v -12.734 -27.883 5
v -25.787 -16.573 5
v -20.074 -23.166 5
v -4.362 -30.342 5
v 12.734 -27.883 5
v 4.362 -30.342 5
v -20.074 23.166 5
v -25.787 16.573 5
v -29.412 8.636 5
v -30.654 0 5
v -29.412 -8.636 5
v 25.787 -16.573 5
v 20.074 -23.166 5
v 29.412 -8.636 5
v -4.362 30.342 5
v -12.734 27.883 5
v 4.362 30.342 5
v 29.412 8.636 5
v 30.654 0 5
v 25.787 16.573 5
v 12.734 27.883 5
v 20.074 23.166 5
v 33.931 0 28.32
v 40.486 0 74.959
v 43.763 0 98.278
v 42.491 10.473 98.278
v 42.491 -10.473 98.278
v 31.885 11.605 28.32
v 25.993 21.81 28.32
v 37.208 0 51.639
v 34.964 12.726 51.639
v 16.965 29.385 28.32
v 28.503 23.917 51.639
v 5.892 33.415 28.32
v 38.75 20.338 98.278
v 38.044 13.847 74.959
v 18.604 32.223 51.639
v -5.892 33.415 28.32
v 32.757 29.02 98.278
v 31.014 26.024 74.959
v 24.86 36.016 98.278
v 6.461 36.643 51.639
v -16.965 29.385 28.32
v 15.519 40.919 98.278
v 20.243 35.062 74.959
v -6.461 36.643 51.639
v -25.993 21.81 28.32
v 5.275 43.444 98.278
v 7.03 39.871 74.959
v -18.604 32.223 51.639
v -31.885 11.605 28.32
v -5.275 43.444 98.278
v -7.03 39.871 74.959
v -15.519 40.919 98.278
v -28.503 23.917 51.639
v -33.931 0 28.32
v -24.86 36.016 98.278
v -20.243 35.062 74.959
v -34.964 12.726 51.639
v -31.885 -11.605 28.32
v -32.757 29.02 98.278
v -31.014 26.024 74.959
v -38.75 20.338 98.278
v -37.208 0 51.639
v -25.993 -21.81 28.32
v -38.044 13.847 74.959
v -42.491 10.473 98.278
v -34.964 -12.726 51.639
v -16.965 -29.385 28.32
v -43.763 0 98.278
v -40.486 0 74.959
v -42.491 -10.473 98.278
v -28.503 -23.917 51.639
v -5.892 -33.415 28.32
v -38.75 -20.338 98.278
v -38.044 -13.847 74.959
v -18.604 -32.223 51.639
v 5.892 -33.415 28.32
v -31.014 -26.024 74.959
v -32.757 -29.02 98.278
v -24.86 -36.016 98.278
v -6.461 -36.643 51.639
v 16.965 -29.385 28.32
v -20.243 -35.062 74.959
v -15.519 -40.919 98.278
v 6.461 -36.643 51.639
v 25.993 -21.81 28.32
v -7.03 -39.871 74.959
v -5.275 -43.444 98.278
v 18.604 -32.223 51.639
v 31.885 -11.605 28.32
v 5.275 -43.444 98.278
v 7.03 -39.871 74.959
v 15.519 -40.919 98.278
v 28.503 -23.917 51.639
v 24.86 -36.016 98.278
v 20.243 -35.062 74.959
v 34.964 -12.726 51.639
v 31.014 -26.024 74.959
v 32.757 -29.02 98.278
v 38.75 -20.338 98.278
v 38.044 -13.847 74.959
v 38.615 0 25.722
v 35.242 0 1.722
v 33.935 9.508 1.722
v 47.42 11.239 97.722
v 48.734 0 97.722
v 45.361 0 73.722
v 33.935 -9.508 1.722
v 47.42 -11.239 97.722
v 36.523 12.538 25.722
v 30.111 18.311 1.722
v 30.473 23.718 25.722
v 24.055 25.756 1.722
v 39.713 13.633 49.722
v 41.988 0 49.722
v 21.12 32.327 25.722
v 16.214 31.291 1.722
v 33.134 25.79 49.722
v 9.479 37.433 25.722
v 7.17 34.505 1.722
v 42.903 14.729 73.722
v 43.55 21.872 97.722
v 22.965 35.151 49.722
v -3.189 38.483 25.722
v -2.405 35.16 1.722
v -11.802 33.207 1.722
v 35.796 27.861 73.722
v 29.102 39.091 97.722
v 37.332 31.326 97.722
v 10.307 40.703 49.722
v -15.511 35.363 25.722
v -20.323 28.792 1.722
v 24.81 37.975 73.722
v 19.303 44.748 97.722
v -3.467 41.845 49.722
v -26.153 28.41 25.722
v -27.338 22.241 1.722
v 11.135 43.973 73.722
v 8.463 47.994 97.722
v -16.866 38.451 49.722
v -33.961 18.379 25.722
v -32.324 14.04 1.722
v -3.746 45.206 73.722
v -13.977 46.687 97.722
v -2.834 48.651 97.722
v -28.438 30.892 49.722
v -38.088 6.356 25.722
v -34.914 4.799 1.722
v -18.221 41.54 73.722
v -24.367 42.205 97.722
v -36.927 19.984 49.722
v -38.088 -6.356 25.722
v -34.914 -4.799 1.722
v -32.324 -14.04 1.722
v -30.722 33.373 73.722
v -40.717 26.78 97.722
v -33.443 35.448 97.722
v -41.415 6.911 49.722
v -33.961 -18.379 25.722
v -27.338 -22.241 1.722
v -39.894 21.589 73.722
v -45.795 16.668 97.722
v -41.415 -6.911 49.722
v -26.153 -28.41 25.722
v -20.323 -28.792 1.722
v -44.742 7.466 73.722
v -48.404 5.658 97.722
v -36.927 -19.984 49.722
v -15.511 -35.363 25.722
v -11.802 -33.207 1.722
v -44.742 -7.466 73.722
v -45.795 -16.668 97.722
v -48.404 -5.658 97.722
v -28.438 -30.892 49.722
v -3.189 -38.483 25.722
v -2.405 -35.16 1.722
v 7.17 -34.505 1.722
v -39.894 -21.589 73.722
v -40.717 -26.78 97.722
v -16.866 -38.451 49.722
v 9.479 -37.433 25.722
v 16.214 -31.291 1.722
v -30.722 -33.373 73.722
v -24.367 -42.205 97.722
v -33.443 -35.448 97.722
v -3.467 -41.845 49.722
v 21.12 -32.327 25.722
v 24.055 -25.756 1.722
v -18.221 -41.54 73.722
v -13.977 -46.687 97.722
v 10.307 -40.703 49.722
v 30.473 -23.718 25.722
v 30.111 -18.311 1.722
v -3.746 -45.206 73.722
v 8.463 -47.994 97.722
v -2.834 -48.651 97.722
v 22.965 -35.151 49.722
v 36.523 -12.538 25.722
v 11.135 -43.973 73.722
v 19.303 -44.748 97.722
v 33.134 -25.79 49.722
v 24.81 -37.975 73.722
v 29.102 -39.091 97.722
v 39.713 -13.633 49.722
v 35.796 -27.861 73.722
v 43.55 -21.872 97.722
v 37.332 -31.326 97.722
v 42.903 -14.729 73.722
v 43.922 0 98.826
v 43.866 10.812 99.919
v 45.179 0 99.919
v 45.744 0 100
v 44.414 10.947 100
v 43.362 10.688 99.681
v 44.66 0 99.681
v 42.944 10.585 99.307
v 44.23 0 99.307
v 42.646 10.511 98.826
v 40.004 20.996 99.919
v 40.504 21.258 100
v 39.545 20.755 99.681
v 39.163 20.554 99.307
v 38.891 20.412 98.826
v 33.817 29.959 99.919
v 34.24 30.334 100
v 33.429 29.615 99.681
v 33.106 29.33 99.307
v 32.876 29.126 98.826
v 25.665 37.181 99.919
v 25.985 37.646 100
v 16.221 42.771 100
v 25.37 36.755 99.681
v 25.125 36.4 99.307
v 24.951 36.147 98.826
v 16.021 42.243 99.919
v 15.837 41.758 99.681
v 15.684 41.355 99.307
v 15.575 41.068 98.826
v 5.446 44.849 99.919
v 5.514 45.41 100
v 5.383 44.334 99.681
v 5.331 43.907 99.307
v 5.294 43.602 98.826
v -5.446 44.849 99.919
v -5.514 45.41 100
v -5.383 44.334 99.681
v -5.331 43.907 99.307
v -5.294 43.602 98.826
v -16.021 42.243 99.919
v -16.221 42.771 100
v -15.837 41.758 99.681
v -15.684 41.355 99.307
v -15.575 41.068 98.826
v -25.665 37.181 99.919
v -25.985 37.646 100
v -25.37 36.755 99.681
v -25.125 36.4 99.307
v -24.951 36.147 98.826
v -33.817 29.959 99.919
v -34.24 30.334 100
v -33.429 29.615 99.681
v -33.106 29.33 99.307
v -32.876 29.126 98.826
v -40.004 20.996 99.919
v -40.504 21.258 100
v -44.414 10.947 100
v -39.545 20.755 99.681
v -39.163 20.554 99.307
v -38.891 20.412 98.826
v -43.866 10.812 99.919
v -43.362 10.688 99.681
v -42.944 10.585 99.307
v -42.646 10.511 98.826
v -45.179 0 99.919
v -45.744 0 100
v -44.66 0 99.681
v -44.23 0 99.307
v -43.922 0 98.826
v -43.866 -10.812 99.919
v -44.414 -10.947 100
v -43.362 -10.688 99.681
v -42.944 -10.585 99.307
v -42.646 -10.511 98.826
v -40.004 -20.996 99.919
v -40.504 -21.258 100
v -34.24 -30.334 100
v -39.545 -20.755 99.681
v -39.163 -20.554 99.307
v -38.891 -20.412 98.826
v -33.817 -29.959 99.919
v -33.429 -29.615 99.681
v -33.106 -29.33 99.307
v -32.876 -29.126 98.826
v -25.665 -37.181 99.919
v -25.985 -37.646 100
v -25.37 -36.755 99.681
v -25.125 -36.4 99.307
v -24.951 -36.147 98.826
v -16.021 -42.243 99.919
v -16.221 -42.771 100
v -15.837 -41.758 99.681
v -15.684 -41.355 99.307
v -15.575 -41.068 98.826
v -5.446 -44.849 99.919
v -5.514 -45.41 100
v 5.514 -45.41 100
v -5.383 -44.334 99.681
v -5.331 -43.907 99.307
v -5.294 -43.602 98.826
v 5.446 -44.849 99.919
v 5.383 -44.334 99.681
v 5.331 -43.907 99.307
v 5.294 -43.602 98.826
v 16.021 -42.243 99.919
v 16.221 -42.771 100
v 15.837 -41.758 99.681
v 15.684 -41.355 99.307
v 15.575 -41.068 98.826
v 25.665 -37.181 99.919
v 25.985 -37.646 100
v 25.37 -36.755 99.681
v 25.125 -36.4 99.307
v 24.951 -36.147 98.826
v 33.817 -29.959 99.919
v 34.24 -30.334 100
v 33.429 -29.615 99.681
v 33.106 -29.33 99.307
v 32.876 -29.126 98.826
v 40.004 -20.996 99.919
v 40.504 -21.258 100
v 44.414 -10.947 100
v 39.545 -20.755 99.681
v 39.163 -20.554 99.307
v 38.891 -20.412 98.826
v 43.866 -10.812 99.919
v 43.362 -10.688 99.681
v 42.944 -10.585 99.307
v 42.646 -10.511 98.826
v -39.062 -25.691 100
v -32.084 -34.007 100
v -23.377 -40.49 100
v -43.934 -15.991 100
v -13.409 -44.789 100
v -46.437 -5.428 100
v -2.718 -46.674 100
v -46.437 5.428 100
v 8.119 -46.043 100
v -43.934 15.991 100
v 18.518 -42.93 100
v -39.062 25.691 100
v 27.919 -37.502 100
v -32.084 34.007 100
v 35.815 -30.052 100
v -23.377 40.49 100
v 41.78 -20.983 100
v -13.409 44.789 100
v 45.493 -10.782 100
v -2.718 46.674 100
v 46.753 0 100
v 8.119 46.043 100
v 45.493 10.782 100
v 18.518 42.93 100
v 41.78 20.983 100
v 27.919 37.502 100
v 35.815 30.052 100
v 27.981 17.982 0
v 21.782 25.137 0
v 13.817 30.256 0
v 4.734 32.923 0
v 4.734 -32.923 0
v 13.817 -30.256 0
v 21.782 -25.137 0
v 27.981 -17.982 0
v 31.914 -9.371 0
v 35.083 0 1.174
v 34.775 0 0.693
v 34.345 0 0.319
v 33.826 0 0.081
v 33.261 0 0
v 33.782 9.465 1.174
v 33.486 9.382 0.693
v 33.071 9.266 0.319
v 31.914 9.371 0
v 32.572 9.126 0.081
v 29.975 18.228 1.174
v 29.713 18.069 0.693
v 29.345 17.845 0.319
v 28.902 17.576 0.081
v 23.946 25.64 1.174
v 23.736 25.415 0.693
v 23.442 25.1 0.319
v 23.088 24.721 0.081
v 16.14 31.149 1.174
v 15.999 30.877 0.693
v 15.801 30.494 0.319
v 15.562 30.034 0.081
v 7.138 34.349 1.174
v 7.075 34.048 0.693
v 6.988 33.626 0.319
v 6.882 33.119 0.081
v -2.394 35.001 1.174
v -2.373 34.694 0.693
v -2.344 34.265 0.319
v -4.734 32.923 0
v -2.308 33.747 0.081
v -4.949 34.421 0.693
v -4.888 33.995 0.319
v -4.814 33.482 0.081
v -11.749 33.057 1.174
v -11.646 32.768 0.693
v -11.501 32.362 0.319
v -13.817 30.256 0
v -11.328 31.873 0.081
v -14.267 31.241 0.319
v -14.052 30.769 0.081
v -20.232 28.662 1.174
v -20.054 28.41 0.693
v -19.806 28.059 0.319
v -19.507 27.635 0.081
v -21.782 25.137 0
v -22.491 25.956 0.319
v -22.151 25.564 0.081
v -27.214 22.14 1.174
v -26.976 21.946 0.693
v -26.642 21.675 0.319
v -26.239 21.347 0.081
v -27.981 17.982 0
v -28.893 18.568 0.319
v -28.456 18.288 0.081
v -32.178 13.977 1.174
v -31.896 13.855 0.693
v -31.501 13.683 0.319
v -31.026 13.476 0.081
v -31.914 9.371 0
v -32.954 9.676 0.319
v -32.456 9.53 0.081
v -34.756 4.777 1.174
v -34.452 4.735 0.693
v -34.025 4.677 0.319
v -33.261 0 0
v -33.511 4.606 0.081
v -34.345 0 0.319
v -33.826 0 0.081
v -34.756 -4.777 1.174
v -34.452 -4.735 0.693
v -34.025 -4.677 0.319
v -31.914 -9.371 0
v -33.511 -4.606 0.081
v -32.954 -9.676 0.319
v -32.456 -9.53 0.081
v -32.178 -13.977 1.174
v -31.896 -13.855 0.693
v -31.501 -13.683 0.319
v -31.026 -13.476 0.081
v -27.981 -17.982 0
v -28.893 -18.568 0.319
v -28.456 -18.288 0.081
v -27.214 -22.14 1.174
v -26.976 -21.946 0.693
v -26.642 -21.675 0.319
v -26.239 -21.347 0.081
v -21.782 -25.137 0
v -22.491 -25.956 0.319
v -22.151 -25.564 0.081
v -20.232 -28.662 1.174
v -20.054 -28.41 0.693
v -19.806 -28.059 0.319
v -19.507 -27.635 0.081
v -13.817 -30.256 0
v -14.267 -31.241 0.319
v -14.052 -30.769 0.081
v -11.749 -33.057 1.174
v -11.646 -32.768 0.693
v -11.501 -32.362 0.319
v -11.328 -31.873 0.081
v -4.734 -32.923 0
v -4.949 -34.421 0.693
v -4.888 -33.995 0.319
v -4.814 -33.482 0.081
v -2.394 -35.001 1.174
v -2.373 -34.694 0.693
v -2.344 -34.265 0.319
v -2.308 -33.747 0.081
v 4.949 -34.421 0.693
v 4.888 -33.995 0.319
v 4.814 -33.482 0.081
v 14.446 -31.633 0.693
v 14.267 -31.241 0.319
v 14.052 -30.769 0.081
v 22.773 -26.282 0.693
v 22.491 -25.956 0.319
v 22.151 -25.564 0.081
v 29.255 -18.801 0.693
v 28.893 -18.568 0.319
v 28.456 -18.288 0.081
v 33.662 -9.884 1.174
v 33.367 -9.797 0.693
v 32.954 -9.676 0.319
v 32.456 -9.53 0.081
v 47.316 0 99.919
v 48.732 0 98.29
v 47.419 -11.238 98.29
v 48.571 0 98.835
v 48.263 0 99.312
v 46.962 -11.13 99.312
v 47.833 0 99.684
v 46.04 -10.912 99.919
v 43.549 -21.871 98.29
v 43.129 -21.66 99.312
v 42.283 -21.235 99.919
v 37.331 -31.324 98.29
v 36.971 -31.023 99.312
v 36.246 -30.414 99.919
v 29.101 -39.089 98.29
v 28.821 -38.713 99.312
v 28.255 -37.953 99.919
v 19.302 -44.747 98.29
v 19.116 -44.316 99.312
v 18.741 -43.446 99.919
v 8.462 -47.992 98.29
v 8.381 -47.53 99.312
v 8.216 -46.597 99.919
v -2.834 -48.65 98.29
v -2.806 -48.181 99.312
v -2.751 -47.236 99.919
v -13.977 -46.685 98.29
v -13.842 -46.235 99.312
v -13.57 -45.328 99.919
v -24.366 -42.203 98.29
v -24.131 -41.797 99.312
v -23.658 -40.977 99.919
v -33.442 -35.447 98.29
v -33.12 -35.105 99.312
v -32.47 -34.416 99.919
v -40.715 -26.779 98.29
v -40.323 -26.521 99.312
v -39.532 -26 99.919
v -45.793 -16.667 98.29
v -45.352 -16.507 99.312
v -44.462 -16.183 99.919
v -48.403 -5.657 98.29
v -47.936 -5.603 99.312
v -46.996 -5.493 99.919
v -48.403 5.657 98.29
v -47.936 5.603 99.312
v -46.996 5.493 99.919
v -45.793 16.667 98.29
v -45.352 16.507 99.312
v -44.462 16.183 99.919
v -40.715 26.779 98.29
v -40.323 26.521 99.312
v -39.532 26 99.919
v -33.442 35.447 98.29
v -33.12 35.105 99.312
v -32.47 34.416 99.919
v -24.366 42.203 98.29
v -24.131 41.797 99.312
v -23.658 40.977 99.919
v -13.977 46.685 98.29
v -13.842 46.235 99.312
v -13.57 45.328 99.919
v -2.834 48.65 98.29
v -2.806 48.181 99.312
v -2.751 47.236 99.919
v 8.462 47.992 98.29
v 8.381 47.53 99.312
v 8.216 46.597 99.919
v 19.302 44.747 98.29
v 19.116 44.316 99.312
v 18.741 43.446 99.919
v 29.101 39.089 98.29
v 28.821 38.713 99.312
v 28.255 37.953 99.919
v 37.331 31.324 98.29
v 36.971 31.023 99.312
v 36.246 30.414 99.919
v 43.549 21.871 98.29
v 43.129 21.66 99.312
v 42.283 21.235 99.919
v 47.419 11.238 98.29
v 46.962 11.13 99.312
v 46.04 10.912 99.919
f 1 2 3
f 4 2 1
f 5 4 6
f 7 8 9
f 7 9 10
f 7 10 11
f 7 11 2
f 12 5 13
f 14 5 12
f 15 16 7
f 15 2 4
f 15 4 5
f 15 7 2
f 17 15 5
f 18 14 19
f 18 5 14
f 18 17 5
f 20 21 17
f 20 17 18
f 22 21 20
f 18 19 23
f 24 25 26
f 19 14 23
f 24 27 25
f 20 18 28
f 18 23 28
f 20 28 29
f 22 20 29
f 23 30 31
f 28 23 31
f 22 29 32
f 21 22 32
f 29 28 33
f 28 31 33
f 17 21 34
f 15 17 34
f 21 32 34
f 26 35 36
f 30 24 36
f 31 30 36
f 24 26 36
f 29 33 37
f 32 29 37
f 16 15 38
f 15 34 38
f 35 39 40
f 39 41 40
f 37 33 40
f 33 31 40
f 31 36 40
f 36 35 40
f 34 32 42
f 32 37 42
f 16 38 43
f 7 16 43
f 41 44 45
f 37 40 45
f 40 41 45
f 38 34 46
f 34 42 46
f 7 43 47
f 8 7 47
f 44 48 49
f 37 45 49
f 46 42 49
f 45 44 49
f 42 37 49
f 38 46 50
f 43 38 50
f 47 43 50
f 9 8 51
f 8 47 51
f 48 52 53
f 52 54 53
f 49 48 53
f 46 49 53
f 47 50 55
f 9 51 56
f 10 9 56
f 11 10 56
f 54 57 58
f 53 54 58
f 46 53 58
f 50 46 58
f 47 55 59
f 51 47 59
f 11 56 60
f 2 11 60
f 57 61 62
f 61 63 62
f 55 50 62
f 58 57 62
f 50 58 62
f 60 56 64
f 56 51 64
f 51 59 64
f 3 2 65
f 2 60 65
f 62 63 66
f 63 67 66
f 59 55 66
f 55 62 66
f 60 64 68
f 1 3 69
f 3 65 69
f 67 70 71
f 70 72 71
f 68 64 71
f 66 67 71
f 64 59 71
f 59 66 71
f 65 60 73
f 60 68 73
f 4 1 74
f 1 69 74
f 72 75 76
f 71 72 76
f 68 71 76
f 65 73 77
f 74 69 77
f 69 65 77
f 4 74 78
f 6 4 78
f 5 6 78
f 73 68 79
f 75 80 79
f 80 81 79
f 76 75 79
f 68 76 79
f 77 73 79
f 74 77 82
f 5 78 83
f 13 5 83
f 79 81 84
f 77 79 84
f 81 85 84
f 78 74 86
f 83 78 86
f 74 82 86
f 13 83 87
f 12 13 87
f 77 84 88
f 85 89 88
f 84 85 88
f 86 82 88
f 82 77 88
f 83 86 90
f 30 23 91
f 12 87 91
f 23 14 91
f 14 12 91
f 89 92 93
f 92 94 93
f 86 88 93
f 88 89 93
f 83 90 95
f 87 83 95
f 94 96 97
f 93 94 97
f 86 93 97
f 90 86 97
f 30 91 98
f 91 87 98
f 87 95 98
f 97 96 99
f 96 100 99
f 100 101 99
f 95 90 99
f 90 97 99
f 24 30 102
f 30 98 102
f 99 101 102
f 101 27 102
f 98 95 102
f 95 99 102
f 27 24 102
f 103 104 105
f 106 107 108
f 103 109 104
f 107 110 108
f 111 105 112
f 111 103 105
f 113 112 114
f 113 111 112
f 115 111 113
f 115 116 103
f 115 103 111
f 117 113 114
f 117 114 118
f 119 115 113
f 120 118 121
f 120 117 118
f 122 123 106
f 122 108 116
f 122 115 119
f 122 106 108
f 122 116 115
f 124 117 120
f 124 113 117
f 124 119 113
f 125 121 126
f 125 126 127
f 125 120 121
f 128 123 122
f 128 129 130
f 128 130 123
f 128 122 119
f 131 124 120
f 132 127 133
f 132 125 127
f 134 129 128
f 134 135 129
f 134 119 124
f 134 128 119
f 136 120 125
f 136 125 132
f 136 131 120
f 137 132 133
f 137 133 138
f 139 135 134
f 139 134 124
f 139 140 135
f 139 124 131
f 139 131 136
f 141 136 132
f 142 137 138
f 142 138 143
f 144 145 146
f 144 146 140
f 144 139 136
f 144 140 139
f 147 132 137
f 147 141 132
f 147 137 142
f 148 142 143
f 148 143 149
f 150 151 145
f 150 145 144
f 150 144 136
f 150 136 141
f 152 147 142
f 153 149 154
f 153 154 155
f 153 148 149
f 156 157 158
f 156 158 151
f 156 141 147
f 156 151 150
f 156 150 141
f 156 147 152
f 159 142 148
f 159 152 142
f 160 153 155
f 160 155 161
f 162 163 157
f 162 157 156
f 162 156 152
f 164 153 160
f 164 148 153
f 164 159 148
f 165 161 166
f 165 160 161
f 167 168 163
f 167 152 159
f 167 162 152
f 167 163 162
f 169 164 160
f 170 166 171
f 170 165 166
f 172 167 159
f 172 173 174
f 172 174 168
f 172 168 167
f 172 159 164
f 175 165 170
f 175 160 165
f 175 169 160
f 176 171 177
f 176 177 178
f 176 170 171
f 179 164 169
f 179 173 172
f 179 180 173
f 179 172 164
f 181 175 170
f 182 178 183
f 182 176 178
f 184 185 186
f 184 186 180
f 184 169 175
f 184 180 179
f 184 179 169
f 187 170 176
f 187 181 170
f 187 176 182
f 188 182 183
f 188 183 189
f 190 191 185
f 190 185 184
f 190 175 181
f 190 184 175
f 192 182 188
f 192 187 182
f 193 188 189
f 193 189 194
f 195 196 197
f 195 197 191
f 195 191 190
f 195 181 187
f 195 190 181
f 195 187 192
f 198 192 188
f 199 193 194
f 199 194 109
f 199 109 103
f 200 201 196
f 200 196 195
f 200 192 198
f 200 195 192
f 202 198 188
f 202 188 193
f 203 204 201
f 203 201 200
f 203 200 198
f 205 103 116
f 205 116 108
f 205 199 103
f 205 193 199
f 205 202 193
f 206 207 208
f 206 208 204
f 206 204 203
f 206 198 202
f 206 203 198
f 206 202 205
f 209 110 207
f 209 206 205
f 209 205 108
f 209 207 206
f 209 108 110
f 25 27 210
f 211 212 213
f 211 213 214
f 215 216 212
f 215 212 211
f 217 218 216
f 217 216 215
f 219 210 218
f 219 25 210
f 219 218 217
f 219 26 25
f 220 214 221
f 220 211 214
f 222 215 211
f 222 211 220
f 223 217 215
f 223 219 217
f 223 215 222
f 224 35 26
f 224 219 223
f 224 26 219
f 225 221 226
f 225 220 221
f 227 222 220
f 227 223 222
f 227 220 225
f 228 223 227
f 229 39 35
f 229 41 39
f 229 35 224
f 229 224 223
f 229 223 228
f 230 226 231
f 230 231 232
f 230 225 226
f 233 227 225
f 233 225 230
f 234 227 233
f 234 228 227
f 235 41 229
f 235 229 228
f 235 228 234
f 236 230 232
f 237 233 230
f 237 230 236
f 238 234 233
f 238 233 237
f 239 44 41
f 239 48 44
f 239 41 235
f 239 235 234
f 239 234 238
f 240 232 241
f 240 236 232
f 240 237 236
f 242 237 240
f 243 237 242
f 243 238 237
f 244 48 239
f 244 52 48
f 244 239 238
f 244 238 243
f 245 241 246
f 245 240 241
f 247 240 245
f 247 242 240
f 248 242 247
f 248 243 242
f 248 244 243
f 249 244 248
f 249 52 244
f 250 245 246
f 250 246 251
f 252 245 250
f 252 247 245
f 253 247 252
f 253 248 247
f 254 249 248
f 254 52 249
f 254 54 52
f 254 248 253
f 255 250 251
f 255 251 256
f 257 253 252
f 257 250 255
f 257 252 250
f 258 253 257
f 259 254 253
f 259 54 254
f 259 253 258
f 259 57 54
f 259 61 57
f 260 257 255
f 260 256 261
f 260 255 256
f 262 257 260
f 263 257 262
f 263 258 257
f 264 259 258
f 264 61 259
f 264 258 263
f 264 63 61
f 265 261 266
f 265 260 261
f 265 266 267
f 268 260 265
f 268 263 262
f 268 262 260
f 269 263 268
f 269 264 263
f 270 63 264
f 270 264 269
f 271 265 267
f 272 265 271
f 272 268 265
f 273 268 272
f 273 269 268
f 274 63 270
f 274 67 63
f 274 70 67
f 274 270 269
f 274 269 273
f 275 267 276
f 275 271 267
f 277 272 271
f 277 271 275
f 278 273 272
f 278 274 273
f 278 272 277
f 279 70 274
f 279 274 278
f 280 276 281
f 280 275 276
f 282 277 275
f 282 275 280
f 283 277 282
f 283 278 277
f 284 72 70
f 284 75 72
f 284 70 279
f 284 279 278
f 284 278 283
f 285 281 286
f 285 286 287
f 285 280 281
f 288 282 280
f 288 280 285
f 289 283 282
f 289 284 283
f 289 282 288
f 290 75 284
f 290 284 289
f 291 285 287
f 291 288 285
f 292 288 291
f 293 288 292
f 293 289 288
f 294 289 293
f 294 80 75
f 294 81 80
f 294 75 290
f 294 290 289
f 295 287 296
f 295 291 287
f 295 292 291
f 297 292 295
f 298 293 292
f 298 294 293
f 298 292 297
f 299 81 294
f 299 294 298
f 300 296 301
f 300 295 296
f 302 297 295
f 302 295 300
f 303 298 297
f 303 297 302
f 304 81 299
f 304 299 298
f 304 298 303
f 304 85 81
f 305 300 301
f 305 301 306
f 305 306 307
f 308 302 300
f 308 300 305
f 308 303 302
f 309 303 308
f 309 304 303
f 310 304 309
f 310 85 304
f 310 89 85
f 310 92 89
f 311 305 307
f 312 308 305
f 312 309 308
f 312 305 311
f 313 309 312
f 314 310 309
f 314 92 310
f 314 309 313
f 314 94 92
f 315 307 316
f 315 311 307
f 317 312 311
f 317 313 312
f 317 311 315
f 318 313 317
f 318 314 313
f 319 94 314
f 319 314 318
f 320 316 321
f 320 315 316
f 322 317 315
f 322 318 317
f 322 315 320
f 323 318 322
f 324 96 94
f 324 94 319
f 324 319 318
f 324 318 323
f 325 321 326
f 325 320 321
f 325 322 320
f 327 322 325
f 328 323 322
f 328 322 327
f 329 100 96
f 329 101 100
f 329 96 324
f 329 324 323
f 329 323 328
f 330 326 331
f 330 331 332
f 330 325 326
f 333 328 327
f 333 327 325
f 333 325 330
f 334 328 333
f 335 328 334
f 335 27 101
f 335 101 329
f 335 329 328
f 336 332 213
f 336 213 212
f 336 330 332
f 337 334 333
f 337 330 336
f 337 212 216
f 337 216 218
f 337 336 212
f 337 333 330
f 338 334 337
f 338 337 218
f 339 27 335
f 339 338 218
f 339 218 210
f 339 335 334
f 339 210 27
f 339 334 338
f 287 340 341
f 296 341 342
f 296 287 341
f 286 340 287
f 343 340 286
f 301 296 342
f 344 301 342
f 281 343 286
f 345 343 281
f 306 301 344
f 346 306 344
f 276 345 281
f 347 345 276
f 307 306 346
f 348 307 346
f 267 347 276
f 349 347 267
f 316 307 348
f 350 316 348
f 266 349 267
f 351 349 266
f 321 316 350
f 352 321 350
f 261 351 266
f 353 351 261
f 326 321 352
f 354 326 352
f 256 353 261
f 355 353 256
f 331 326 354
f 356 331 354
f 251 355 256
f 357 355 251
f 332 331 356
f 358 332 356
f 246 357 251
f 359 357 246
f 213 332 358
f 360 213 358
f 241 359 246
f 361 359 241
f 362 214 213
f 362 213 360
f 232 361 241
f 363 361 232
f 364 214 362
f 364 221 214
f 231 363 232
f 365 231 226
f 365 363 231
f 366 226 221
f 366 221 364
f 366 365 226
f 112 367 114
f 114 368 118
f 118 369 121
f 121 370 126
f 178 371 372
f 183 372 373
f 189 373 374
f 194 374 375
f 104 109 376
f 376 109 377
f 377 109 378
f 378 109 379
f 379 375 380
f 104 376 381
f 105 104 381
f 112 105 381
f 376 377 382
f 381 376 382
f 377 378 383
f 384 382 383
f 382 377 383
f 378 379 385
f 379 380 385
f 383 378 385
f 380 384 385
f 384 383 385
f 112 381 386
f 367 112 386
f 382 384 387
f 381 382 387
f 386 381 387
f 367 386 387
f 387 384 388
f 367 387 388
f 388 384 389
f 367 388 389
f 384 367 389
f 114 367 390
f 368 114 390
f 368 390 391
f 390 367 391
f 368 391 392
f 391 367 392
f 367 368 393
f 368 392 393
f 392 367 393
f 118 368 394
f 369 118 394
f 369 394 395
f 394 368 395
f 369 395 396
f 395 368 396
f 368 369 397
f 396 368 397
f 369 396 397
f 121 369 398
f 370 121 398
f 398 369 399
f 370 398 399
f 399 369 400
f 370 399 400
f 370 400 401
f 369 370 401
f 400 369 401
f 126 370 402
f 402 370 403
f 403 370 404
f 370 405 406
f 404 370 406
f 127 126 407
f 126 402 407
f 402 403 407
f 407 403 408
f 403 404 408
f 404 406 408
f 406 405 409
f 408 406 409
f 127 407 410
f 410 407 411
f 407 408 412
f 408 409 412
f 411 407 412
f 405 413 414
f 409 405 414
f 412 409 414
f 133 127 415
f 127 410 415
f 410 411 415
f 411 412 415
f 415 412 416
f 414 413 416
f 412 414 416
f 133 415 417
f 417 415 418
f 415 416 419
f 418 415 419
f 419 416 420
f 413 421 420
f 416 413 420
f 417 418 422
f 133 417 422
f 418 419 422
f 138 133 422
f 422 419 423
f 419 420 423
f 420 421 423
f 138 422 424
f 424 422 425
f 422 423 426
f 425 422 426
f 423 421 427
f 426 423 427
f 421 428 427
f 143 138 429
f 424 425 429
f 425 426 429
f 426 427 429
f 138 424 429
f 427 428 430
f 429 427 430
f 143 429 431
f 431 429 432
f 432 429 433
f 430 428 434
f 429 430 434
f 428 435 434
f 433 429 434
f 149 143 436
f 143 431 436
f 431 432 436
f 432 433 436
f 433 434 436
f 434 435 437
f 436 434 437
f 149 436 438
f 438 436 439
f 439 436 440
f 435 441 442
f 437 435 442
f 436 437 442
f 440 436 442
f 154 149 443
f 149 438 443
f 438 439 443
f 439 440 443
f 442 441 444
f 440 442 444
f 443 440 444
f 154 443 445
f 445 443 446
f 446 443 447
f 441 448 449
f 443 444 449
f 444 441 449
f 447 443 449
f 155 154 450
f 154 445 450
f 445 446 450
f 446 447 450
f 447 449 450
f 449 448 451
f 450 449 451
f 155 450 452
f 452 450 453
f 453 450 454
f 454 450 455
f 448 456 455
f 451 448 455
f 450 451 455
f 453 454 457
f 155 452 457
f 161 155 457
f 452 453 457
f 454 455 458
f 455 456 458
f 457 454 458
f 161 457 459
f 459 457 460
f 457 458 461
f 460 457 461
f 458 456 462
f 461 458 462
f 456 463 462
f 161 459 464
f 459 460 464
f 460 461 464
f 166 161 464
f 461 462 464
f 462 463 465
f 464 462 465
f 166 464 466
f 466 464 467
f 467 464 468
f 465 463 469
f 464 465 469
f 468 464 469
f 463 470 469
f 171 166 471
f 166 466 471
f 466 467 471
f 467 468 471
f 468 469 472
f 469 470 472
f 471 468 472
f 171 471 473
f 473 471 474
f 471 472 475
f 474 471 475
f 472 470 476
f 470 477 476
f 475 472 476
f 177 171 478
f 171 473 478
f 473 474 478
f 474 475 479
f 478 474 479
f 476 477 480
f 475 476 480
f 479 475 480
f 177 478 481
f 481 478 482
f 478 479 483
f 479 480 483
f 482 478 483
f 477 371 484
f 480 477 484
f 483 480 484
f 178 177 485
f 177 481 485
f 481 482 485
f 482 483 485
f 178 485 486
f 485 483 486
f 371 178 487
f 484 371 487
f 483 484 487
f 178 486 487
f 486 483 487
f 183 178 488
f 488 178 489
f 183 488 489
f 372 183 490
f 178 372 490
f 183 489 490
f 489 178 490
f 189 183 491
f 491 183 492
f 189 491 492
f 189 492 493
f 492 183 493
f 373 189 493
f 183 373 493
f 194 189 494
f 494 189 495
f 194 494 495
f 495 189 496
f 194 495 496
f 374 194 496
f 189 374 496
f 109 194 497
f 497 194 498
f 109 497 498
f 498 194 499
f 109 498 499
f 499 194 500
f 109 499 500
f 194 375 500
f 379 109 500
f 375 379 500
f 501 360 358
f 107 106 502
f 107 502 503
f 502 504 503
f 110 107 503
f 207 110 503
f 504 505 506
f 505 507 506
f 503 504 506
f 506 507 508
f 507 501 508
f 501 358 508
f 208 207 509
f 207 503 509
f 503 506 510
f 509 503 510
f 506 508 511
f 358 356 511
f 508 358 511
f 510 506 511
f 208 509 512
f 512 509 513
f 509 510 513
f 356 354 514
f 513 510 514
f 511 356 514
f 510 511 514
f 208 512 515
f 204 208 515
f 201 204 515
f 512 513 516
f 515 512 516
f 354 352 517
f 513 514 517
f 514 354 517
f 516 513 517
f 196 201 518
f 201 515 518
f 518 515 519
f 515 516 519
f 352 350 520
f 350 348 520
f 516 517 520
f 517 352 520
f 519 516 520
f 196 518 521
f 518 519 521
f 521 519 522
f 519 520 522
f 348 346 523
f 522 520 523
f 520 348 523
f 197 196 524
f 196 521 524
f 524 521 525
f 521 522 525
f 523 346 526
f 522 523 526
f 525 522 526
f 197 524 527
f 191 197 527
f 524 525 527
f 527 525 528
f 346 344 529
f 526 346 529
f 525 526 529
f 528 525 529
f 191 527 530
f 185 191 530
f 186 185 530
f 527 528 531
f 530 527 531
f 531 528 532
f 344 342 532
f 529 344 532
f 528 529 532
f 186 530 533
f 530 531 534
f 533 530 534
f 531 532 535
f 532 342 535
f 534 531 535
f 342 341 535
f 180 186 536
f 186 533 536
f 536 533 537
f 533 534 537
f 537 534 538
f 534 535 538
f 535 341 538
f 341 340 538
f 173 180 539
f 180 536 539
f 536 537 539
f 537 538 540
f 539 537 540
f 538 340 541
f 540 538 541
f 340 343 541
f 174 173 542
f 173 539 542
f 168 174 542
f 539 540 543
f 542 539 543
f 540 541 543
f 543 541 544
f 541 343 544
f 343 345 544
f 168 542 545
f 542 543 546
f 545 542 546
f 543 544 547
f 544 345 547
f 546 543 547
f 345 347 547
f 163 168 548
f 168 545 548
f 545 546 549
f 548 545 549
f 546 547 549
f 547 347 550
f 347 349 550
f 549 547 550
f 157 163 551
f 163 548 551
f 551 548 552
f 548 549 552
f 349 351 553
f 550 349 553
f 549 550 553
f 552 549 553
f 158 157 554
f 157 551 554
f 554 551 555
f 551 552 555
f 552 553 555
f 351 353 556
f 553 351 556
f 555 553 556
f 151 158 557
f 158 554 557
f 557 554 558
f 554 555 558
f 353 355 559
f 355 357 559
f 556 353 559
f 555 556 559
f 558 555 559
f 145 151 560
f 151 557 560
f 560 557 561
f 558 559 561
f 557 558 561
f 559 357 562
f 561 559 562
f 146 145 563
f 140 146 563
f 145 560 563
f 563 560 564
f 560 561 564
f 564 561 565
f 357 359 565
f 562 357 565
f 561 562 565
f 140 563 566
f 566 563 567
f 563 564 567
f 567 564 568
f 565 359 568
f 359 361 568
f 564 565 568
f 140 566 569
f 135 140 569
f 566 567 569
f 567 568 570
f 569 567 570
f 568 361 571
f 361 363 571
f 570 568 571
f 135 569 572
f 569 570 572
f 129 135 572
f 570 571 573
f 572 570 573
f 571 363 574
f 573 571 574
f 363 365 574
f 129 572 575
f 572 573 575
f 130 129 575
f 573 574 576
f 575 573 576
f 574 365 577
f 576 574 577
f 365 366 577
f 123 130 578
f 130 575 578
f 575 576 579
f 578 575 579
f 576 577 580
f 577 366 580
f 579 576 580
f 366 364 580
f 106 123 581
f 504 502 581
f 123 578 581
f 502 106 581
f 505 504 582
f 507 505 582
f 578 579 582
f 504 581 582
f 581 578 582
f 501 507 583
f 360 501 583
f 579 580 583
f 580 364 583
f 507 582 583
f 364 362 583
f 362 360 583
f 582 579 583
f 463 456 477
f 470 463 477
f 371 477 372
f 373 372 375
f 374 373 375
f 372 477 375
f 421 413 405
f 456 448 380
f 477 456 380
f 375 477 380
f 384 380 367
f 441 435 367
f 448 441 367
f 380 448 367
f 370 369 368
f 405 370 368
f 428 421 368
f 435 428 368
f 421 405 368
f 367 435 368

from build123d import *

# Parameters (mm, degrees)
F0_R     = 35
F1_DEPTH = 100
F1_TAPER = -8
F2_T     = -5
F3_R     = 2


with BuildPart() as f1:
    # F0 (on Top) → F1 (new body)
    with BuildSketch(Plane.XY):
        Circle(F0_R)
    extrude(amount=F1_DEPTH, taper=F1_TAPER)

    # F2
    f2_openings = [f1.faces().sort_by_distance(p)[0] for p in [
        (0, 0, 100),
    ]]
    offset(amount=F2_T, openings=f2_openings, kind=Kind.INTERSECTION)

    # F3
    f3_edges = [f1.edges().sort_by_distance(p)[0] for p in [
        (-49.054083, 0, 100),
        (-44.004946, 0, 100),
        (-35, 0, 0),
    ]]
    fillet(f3_edges, radius=F3_R)


solid = f1.part
